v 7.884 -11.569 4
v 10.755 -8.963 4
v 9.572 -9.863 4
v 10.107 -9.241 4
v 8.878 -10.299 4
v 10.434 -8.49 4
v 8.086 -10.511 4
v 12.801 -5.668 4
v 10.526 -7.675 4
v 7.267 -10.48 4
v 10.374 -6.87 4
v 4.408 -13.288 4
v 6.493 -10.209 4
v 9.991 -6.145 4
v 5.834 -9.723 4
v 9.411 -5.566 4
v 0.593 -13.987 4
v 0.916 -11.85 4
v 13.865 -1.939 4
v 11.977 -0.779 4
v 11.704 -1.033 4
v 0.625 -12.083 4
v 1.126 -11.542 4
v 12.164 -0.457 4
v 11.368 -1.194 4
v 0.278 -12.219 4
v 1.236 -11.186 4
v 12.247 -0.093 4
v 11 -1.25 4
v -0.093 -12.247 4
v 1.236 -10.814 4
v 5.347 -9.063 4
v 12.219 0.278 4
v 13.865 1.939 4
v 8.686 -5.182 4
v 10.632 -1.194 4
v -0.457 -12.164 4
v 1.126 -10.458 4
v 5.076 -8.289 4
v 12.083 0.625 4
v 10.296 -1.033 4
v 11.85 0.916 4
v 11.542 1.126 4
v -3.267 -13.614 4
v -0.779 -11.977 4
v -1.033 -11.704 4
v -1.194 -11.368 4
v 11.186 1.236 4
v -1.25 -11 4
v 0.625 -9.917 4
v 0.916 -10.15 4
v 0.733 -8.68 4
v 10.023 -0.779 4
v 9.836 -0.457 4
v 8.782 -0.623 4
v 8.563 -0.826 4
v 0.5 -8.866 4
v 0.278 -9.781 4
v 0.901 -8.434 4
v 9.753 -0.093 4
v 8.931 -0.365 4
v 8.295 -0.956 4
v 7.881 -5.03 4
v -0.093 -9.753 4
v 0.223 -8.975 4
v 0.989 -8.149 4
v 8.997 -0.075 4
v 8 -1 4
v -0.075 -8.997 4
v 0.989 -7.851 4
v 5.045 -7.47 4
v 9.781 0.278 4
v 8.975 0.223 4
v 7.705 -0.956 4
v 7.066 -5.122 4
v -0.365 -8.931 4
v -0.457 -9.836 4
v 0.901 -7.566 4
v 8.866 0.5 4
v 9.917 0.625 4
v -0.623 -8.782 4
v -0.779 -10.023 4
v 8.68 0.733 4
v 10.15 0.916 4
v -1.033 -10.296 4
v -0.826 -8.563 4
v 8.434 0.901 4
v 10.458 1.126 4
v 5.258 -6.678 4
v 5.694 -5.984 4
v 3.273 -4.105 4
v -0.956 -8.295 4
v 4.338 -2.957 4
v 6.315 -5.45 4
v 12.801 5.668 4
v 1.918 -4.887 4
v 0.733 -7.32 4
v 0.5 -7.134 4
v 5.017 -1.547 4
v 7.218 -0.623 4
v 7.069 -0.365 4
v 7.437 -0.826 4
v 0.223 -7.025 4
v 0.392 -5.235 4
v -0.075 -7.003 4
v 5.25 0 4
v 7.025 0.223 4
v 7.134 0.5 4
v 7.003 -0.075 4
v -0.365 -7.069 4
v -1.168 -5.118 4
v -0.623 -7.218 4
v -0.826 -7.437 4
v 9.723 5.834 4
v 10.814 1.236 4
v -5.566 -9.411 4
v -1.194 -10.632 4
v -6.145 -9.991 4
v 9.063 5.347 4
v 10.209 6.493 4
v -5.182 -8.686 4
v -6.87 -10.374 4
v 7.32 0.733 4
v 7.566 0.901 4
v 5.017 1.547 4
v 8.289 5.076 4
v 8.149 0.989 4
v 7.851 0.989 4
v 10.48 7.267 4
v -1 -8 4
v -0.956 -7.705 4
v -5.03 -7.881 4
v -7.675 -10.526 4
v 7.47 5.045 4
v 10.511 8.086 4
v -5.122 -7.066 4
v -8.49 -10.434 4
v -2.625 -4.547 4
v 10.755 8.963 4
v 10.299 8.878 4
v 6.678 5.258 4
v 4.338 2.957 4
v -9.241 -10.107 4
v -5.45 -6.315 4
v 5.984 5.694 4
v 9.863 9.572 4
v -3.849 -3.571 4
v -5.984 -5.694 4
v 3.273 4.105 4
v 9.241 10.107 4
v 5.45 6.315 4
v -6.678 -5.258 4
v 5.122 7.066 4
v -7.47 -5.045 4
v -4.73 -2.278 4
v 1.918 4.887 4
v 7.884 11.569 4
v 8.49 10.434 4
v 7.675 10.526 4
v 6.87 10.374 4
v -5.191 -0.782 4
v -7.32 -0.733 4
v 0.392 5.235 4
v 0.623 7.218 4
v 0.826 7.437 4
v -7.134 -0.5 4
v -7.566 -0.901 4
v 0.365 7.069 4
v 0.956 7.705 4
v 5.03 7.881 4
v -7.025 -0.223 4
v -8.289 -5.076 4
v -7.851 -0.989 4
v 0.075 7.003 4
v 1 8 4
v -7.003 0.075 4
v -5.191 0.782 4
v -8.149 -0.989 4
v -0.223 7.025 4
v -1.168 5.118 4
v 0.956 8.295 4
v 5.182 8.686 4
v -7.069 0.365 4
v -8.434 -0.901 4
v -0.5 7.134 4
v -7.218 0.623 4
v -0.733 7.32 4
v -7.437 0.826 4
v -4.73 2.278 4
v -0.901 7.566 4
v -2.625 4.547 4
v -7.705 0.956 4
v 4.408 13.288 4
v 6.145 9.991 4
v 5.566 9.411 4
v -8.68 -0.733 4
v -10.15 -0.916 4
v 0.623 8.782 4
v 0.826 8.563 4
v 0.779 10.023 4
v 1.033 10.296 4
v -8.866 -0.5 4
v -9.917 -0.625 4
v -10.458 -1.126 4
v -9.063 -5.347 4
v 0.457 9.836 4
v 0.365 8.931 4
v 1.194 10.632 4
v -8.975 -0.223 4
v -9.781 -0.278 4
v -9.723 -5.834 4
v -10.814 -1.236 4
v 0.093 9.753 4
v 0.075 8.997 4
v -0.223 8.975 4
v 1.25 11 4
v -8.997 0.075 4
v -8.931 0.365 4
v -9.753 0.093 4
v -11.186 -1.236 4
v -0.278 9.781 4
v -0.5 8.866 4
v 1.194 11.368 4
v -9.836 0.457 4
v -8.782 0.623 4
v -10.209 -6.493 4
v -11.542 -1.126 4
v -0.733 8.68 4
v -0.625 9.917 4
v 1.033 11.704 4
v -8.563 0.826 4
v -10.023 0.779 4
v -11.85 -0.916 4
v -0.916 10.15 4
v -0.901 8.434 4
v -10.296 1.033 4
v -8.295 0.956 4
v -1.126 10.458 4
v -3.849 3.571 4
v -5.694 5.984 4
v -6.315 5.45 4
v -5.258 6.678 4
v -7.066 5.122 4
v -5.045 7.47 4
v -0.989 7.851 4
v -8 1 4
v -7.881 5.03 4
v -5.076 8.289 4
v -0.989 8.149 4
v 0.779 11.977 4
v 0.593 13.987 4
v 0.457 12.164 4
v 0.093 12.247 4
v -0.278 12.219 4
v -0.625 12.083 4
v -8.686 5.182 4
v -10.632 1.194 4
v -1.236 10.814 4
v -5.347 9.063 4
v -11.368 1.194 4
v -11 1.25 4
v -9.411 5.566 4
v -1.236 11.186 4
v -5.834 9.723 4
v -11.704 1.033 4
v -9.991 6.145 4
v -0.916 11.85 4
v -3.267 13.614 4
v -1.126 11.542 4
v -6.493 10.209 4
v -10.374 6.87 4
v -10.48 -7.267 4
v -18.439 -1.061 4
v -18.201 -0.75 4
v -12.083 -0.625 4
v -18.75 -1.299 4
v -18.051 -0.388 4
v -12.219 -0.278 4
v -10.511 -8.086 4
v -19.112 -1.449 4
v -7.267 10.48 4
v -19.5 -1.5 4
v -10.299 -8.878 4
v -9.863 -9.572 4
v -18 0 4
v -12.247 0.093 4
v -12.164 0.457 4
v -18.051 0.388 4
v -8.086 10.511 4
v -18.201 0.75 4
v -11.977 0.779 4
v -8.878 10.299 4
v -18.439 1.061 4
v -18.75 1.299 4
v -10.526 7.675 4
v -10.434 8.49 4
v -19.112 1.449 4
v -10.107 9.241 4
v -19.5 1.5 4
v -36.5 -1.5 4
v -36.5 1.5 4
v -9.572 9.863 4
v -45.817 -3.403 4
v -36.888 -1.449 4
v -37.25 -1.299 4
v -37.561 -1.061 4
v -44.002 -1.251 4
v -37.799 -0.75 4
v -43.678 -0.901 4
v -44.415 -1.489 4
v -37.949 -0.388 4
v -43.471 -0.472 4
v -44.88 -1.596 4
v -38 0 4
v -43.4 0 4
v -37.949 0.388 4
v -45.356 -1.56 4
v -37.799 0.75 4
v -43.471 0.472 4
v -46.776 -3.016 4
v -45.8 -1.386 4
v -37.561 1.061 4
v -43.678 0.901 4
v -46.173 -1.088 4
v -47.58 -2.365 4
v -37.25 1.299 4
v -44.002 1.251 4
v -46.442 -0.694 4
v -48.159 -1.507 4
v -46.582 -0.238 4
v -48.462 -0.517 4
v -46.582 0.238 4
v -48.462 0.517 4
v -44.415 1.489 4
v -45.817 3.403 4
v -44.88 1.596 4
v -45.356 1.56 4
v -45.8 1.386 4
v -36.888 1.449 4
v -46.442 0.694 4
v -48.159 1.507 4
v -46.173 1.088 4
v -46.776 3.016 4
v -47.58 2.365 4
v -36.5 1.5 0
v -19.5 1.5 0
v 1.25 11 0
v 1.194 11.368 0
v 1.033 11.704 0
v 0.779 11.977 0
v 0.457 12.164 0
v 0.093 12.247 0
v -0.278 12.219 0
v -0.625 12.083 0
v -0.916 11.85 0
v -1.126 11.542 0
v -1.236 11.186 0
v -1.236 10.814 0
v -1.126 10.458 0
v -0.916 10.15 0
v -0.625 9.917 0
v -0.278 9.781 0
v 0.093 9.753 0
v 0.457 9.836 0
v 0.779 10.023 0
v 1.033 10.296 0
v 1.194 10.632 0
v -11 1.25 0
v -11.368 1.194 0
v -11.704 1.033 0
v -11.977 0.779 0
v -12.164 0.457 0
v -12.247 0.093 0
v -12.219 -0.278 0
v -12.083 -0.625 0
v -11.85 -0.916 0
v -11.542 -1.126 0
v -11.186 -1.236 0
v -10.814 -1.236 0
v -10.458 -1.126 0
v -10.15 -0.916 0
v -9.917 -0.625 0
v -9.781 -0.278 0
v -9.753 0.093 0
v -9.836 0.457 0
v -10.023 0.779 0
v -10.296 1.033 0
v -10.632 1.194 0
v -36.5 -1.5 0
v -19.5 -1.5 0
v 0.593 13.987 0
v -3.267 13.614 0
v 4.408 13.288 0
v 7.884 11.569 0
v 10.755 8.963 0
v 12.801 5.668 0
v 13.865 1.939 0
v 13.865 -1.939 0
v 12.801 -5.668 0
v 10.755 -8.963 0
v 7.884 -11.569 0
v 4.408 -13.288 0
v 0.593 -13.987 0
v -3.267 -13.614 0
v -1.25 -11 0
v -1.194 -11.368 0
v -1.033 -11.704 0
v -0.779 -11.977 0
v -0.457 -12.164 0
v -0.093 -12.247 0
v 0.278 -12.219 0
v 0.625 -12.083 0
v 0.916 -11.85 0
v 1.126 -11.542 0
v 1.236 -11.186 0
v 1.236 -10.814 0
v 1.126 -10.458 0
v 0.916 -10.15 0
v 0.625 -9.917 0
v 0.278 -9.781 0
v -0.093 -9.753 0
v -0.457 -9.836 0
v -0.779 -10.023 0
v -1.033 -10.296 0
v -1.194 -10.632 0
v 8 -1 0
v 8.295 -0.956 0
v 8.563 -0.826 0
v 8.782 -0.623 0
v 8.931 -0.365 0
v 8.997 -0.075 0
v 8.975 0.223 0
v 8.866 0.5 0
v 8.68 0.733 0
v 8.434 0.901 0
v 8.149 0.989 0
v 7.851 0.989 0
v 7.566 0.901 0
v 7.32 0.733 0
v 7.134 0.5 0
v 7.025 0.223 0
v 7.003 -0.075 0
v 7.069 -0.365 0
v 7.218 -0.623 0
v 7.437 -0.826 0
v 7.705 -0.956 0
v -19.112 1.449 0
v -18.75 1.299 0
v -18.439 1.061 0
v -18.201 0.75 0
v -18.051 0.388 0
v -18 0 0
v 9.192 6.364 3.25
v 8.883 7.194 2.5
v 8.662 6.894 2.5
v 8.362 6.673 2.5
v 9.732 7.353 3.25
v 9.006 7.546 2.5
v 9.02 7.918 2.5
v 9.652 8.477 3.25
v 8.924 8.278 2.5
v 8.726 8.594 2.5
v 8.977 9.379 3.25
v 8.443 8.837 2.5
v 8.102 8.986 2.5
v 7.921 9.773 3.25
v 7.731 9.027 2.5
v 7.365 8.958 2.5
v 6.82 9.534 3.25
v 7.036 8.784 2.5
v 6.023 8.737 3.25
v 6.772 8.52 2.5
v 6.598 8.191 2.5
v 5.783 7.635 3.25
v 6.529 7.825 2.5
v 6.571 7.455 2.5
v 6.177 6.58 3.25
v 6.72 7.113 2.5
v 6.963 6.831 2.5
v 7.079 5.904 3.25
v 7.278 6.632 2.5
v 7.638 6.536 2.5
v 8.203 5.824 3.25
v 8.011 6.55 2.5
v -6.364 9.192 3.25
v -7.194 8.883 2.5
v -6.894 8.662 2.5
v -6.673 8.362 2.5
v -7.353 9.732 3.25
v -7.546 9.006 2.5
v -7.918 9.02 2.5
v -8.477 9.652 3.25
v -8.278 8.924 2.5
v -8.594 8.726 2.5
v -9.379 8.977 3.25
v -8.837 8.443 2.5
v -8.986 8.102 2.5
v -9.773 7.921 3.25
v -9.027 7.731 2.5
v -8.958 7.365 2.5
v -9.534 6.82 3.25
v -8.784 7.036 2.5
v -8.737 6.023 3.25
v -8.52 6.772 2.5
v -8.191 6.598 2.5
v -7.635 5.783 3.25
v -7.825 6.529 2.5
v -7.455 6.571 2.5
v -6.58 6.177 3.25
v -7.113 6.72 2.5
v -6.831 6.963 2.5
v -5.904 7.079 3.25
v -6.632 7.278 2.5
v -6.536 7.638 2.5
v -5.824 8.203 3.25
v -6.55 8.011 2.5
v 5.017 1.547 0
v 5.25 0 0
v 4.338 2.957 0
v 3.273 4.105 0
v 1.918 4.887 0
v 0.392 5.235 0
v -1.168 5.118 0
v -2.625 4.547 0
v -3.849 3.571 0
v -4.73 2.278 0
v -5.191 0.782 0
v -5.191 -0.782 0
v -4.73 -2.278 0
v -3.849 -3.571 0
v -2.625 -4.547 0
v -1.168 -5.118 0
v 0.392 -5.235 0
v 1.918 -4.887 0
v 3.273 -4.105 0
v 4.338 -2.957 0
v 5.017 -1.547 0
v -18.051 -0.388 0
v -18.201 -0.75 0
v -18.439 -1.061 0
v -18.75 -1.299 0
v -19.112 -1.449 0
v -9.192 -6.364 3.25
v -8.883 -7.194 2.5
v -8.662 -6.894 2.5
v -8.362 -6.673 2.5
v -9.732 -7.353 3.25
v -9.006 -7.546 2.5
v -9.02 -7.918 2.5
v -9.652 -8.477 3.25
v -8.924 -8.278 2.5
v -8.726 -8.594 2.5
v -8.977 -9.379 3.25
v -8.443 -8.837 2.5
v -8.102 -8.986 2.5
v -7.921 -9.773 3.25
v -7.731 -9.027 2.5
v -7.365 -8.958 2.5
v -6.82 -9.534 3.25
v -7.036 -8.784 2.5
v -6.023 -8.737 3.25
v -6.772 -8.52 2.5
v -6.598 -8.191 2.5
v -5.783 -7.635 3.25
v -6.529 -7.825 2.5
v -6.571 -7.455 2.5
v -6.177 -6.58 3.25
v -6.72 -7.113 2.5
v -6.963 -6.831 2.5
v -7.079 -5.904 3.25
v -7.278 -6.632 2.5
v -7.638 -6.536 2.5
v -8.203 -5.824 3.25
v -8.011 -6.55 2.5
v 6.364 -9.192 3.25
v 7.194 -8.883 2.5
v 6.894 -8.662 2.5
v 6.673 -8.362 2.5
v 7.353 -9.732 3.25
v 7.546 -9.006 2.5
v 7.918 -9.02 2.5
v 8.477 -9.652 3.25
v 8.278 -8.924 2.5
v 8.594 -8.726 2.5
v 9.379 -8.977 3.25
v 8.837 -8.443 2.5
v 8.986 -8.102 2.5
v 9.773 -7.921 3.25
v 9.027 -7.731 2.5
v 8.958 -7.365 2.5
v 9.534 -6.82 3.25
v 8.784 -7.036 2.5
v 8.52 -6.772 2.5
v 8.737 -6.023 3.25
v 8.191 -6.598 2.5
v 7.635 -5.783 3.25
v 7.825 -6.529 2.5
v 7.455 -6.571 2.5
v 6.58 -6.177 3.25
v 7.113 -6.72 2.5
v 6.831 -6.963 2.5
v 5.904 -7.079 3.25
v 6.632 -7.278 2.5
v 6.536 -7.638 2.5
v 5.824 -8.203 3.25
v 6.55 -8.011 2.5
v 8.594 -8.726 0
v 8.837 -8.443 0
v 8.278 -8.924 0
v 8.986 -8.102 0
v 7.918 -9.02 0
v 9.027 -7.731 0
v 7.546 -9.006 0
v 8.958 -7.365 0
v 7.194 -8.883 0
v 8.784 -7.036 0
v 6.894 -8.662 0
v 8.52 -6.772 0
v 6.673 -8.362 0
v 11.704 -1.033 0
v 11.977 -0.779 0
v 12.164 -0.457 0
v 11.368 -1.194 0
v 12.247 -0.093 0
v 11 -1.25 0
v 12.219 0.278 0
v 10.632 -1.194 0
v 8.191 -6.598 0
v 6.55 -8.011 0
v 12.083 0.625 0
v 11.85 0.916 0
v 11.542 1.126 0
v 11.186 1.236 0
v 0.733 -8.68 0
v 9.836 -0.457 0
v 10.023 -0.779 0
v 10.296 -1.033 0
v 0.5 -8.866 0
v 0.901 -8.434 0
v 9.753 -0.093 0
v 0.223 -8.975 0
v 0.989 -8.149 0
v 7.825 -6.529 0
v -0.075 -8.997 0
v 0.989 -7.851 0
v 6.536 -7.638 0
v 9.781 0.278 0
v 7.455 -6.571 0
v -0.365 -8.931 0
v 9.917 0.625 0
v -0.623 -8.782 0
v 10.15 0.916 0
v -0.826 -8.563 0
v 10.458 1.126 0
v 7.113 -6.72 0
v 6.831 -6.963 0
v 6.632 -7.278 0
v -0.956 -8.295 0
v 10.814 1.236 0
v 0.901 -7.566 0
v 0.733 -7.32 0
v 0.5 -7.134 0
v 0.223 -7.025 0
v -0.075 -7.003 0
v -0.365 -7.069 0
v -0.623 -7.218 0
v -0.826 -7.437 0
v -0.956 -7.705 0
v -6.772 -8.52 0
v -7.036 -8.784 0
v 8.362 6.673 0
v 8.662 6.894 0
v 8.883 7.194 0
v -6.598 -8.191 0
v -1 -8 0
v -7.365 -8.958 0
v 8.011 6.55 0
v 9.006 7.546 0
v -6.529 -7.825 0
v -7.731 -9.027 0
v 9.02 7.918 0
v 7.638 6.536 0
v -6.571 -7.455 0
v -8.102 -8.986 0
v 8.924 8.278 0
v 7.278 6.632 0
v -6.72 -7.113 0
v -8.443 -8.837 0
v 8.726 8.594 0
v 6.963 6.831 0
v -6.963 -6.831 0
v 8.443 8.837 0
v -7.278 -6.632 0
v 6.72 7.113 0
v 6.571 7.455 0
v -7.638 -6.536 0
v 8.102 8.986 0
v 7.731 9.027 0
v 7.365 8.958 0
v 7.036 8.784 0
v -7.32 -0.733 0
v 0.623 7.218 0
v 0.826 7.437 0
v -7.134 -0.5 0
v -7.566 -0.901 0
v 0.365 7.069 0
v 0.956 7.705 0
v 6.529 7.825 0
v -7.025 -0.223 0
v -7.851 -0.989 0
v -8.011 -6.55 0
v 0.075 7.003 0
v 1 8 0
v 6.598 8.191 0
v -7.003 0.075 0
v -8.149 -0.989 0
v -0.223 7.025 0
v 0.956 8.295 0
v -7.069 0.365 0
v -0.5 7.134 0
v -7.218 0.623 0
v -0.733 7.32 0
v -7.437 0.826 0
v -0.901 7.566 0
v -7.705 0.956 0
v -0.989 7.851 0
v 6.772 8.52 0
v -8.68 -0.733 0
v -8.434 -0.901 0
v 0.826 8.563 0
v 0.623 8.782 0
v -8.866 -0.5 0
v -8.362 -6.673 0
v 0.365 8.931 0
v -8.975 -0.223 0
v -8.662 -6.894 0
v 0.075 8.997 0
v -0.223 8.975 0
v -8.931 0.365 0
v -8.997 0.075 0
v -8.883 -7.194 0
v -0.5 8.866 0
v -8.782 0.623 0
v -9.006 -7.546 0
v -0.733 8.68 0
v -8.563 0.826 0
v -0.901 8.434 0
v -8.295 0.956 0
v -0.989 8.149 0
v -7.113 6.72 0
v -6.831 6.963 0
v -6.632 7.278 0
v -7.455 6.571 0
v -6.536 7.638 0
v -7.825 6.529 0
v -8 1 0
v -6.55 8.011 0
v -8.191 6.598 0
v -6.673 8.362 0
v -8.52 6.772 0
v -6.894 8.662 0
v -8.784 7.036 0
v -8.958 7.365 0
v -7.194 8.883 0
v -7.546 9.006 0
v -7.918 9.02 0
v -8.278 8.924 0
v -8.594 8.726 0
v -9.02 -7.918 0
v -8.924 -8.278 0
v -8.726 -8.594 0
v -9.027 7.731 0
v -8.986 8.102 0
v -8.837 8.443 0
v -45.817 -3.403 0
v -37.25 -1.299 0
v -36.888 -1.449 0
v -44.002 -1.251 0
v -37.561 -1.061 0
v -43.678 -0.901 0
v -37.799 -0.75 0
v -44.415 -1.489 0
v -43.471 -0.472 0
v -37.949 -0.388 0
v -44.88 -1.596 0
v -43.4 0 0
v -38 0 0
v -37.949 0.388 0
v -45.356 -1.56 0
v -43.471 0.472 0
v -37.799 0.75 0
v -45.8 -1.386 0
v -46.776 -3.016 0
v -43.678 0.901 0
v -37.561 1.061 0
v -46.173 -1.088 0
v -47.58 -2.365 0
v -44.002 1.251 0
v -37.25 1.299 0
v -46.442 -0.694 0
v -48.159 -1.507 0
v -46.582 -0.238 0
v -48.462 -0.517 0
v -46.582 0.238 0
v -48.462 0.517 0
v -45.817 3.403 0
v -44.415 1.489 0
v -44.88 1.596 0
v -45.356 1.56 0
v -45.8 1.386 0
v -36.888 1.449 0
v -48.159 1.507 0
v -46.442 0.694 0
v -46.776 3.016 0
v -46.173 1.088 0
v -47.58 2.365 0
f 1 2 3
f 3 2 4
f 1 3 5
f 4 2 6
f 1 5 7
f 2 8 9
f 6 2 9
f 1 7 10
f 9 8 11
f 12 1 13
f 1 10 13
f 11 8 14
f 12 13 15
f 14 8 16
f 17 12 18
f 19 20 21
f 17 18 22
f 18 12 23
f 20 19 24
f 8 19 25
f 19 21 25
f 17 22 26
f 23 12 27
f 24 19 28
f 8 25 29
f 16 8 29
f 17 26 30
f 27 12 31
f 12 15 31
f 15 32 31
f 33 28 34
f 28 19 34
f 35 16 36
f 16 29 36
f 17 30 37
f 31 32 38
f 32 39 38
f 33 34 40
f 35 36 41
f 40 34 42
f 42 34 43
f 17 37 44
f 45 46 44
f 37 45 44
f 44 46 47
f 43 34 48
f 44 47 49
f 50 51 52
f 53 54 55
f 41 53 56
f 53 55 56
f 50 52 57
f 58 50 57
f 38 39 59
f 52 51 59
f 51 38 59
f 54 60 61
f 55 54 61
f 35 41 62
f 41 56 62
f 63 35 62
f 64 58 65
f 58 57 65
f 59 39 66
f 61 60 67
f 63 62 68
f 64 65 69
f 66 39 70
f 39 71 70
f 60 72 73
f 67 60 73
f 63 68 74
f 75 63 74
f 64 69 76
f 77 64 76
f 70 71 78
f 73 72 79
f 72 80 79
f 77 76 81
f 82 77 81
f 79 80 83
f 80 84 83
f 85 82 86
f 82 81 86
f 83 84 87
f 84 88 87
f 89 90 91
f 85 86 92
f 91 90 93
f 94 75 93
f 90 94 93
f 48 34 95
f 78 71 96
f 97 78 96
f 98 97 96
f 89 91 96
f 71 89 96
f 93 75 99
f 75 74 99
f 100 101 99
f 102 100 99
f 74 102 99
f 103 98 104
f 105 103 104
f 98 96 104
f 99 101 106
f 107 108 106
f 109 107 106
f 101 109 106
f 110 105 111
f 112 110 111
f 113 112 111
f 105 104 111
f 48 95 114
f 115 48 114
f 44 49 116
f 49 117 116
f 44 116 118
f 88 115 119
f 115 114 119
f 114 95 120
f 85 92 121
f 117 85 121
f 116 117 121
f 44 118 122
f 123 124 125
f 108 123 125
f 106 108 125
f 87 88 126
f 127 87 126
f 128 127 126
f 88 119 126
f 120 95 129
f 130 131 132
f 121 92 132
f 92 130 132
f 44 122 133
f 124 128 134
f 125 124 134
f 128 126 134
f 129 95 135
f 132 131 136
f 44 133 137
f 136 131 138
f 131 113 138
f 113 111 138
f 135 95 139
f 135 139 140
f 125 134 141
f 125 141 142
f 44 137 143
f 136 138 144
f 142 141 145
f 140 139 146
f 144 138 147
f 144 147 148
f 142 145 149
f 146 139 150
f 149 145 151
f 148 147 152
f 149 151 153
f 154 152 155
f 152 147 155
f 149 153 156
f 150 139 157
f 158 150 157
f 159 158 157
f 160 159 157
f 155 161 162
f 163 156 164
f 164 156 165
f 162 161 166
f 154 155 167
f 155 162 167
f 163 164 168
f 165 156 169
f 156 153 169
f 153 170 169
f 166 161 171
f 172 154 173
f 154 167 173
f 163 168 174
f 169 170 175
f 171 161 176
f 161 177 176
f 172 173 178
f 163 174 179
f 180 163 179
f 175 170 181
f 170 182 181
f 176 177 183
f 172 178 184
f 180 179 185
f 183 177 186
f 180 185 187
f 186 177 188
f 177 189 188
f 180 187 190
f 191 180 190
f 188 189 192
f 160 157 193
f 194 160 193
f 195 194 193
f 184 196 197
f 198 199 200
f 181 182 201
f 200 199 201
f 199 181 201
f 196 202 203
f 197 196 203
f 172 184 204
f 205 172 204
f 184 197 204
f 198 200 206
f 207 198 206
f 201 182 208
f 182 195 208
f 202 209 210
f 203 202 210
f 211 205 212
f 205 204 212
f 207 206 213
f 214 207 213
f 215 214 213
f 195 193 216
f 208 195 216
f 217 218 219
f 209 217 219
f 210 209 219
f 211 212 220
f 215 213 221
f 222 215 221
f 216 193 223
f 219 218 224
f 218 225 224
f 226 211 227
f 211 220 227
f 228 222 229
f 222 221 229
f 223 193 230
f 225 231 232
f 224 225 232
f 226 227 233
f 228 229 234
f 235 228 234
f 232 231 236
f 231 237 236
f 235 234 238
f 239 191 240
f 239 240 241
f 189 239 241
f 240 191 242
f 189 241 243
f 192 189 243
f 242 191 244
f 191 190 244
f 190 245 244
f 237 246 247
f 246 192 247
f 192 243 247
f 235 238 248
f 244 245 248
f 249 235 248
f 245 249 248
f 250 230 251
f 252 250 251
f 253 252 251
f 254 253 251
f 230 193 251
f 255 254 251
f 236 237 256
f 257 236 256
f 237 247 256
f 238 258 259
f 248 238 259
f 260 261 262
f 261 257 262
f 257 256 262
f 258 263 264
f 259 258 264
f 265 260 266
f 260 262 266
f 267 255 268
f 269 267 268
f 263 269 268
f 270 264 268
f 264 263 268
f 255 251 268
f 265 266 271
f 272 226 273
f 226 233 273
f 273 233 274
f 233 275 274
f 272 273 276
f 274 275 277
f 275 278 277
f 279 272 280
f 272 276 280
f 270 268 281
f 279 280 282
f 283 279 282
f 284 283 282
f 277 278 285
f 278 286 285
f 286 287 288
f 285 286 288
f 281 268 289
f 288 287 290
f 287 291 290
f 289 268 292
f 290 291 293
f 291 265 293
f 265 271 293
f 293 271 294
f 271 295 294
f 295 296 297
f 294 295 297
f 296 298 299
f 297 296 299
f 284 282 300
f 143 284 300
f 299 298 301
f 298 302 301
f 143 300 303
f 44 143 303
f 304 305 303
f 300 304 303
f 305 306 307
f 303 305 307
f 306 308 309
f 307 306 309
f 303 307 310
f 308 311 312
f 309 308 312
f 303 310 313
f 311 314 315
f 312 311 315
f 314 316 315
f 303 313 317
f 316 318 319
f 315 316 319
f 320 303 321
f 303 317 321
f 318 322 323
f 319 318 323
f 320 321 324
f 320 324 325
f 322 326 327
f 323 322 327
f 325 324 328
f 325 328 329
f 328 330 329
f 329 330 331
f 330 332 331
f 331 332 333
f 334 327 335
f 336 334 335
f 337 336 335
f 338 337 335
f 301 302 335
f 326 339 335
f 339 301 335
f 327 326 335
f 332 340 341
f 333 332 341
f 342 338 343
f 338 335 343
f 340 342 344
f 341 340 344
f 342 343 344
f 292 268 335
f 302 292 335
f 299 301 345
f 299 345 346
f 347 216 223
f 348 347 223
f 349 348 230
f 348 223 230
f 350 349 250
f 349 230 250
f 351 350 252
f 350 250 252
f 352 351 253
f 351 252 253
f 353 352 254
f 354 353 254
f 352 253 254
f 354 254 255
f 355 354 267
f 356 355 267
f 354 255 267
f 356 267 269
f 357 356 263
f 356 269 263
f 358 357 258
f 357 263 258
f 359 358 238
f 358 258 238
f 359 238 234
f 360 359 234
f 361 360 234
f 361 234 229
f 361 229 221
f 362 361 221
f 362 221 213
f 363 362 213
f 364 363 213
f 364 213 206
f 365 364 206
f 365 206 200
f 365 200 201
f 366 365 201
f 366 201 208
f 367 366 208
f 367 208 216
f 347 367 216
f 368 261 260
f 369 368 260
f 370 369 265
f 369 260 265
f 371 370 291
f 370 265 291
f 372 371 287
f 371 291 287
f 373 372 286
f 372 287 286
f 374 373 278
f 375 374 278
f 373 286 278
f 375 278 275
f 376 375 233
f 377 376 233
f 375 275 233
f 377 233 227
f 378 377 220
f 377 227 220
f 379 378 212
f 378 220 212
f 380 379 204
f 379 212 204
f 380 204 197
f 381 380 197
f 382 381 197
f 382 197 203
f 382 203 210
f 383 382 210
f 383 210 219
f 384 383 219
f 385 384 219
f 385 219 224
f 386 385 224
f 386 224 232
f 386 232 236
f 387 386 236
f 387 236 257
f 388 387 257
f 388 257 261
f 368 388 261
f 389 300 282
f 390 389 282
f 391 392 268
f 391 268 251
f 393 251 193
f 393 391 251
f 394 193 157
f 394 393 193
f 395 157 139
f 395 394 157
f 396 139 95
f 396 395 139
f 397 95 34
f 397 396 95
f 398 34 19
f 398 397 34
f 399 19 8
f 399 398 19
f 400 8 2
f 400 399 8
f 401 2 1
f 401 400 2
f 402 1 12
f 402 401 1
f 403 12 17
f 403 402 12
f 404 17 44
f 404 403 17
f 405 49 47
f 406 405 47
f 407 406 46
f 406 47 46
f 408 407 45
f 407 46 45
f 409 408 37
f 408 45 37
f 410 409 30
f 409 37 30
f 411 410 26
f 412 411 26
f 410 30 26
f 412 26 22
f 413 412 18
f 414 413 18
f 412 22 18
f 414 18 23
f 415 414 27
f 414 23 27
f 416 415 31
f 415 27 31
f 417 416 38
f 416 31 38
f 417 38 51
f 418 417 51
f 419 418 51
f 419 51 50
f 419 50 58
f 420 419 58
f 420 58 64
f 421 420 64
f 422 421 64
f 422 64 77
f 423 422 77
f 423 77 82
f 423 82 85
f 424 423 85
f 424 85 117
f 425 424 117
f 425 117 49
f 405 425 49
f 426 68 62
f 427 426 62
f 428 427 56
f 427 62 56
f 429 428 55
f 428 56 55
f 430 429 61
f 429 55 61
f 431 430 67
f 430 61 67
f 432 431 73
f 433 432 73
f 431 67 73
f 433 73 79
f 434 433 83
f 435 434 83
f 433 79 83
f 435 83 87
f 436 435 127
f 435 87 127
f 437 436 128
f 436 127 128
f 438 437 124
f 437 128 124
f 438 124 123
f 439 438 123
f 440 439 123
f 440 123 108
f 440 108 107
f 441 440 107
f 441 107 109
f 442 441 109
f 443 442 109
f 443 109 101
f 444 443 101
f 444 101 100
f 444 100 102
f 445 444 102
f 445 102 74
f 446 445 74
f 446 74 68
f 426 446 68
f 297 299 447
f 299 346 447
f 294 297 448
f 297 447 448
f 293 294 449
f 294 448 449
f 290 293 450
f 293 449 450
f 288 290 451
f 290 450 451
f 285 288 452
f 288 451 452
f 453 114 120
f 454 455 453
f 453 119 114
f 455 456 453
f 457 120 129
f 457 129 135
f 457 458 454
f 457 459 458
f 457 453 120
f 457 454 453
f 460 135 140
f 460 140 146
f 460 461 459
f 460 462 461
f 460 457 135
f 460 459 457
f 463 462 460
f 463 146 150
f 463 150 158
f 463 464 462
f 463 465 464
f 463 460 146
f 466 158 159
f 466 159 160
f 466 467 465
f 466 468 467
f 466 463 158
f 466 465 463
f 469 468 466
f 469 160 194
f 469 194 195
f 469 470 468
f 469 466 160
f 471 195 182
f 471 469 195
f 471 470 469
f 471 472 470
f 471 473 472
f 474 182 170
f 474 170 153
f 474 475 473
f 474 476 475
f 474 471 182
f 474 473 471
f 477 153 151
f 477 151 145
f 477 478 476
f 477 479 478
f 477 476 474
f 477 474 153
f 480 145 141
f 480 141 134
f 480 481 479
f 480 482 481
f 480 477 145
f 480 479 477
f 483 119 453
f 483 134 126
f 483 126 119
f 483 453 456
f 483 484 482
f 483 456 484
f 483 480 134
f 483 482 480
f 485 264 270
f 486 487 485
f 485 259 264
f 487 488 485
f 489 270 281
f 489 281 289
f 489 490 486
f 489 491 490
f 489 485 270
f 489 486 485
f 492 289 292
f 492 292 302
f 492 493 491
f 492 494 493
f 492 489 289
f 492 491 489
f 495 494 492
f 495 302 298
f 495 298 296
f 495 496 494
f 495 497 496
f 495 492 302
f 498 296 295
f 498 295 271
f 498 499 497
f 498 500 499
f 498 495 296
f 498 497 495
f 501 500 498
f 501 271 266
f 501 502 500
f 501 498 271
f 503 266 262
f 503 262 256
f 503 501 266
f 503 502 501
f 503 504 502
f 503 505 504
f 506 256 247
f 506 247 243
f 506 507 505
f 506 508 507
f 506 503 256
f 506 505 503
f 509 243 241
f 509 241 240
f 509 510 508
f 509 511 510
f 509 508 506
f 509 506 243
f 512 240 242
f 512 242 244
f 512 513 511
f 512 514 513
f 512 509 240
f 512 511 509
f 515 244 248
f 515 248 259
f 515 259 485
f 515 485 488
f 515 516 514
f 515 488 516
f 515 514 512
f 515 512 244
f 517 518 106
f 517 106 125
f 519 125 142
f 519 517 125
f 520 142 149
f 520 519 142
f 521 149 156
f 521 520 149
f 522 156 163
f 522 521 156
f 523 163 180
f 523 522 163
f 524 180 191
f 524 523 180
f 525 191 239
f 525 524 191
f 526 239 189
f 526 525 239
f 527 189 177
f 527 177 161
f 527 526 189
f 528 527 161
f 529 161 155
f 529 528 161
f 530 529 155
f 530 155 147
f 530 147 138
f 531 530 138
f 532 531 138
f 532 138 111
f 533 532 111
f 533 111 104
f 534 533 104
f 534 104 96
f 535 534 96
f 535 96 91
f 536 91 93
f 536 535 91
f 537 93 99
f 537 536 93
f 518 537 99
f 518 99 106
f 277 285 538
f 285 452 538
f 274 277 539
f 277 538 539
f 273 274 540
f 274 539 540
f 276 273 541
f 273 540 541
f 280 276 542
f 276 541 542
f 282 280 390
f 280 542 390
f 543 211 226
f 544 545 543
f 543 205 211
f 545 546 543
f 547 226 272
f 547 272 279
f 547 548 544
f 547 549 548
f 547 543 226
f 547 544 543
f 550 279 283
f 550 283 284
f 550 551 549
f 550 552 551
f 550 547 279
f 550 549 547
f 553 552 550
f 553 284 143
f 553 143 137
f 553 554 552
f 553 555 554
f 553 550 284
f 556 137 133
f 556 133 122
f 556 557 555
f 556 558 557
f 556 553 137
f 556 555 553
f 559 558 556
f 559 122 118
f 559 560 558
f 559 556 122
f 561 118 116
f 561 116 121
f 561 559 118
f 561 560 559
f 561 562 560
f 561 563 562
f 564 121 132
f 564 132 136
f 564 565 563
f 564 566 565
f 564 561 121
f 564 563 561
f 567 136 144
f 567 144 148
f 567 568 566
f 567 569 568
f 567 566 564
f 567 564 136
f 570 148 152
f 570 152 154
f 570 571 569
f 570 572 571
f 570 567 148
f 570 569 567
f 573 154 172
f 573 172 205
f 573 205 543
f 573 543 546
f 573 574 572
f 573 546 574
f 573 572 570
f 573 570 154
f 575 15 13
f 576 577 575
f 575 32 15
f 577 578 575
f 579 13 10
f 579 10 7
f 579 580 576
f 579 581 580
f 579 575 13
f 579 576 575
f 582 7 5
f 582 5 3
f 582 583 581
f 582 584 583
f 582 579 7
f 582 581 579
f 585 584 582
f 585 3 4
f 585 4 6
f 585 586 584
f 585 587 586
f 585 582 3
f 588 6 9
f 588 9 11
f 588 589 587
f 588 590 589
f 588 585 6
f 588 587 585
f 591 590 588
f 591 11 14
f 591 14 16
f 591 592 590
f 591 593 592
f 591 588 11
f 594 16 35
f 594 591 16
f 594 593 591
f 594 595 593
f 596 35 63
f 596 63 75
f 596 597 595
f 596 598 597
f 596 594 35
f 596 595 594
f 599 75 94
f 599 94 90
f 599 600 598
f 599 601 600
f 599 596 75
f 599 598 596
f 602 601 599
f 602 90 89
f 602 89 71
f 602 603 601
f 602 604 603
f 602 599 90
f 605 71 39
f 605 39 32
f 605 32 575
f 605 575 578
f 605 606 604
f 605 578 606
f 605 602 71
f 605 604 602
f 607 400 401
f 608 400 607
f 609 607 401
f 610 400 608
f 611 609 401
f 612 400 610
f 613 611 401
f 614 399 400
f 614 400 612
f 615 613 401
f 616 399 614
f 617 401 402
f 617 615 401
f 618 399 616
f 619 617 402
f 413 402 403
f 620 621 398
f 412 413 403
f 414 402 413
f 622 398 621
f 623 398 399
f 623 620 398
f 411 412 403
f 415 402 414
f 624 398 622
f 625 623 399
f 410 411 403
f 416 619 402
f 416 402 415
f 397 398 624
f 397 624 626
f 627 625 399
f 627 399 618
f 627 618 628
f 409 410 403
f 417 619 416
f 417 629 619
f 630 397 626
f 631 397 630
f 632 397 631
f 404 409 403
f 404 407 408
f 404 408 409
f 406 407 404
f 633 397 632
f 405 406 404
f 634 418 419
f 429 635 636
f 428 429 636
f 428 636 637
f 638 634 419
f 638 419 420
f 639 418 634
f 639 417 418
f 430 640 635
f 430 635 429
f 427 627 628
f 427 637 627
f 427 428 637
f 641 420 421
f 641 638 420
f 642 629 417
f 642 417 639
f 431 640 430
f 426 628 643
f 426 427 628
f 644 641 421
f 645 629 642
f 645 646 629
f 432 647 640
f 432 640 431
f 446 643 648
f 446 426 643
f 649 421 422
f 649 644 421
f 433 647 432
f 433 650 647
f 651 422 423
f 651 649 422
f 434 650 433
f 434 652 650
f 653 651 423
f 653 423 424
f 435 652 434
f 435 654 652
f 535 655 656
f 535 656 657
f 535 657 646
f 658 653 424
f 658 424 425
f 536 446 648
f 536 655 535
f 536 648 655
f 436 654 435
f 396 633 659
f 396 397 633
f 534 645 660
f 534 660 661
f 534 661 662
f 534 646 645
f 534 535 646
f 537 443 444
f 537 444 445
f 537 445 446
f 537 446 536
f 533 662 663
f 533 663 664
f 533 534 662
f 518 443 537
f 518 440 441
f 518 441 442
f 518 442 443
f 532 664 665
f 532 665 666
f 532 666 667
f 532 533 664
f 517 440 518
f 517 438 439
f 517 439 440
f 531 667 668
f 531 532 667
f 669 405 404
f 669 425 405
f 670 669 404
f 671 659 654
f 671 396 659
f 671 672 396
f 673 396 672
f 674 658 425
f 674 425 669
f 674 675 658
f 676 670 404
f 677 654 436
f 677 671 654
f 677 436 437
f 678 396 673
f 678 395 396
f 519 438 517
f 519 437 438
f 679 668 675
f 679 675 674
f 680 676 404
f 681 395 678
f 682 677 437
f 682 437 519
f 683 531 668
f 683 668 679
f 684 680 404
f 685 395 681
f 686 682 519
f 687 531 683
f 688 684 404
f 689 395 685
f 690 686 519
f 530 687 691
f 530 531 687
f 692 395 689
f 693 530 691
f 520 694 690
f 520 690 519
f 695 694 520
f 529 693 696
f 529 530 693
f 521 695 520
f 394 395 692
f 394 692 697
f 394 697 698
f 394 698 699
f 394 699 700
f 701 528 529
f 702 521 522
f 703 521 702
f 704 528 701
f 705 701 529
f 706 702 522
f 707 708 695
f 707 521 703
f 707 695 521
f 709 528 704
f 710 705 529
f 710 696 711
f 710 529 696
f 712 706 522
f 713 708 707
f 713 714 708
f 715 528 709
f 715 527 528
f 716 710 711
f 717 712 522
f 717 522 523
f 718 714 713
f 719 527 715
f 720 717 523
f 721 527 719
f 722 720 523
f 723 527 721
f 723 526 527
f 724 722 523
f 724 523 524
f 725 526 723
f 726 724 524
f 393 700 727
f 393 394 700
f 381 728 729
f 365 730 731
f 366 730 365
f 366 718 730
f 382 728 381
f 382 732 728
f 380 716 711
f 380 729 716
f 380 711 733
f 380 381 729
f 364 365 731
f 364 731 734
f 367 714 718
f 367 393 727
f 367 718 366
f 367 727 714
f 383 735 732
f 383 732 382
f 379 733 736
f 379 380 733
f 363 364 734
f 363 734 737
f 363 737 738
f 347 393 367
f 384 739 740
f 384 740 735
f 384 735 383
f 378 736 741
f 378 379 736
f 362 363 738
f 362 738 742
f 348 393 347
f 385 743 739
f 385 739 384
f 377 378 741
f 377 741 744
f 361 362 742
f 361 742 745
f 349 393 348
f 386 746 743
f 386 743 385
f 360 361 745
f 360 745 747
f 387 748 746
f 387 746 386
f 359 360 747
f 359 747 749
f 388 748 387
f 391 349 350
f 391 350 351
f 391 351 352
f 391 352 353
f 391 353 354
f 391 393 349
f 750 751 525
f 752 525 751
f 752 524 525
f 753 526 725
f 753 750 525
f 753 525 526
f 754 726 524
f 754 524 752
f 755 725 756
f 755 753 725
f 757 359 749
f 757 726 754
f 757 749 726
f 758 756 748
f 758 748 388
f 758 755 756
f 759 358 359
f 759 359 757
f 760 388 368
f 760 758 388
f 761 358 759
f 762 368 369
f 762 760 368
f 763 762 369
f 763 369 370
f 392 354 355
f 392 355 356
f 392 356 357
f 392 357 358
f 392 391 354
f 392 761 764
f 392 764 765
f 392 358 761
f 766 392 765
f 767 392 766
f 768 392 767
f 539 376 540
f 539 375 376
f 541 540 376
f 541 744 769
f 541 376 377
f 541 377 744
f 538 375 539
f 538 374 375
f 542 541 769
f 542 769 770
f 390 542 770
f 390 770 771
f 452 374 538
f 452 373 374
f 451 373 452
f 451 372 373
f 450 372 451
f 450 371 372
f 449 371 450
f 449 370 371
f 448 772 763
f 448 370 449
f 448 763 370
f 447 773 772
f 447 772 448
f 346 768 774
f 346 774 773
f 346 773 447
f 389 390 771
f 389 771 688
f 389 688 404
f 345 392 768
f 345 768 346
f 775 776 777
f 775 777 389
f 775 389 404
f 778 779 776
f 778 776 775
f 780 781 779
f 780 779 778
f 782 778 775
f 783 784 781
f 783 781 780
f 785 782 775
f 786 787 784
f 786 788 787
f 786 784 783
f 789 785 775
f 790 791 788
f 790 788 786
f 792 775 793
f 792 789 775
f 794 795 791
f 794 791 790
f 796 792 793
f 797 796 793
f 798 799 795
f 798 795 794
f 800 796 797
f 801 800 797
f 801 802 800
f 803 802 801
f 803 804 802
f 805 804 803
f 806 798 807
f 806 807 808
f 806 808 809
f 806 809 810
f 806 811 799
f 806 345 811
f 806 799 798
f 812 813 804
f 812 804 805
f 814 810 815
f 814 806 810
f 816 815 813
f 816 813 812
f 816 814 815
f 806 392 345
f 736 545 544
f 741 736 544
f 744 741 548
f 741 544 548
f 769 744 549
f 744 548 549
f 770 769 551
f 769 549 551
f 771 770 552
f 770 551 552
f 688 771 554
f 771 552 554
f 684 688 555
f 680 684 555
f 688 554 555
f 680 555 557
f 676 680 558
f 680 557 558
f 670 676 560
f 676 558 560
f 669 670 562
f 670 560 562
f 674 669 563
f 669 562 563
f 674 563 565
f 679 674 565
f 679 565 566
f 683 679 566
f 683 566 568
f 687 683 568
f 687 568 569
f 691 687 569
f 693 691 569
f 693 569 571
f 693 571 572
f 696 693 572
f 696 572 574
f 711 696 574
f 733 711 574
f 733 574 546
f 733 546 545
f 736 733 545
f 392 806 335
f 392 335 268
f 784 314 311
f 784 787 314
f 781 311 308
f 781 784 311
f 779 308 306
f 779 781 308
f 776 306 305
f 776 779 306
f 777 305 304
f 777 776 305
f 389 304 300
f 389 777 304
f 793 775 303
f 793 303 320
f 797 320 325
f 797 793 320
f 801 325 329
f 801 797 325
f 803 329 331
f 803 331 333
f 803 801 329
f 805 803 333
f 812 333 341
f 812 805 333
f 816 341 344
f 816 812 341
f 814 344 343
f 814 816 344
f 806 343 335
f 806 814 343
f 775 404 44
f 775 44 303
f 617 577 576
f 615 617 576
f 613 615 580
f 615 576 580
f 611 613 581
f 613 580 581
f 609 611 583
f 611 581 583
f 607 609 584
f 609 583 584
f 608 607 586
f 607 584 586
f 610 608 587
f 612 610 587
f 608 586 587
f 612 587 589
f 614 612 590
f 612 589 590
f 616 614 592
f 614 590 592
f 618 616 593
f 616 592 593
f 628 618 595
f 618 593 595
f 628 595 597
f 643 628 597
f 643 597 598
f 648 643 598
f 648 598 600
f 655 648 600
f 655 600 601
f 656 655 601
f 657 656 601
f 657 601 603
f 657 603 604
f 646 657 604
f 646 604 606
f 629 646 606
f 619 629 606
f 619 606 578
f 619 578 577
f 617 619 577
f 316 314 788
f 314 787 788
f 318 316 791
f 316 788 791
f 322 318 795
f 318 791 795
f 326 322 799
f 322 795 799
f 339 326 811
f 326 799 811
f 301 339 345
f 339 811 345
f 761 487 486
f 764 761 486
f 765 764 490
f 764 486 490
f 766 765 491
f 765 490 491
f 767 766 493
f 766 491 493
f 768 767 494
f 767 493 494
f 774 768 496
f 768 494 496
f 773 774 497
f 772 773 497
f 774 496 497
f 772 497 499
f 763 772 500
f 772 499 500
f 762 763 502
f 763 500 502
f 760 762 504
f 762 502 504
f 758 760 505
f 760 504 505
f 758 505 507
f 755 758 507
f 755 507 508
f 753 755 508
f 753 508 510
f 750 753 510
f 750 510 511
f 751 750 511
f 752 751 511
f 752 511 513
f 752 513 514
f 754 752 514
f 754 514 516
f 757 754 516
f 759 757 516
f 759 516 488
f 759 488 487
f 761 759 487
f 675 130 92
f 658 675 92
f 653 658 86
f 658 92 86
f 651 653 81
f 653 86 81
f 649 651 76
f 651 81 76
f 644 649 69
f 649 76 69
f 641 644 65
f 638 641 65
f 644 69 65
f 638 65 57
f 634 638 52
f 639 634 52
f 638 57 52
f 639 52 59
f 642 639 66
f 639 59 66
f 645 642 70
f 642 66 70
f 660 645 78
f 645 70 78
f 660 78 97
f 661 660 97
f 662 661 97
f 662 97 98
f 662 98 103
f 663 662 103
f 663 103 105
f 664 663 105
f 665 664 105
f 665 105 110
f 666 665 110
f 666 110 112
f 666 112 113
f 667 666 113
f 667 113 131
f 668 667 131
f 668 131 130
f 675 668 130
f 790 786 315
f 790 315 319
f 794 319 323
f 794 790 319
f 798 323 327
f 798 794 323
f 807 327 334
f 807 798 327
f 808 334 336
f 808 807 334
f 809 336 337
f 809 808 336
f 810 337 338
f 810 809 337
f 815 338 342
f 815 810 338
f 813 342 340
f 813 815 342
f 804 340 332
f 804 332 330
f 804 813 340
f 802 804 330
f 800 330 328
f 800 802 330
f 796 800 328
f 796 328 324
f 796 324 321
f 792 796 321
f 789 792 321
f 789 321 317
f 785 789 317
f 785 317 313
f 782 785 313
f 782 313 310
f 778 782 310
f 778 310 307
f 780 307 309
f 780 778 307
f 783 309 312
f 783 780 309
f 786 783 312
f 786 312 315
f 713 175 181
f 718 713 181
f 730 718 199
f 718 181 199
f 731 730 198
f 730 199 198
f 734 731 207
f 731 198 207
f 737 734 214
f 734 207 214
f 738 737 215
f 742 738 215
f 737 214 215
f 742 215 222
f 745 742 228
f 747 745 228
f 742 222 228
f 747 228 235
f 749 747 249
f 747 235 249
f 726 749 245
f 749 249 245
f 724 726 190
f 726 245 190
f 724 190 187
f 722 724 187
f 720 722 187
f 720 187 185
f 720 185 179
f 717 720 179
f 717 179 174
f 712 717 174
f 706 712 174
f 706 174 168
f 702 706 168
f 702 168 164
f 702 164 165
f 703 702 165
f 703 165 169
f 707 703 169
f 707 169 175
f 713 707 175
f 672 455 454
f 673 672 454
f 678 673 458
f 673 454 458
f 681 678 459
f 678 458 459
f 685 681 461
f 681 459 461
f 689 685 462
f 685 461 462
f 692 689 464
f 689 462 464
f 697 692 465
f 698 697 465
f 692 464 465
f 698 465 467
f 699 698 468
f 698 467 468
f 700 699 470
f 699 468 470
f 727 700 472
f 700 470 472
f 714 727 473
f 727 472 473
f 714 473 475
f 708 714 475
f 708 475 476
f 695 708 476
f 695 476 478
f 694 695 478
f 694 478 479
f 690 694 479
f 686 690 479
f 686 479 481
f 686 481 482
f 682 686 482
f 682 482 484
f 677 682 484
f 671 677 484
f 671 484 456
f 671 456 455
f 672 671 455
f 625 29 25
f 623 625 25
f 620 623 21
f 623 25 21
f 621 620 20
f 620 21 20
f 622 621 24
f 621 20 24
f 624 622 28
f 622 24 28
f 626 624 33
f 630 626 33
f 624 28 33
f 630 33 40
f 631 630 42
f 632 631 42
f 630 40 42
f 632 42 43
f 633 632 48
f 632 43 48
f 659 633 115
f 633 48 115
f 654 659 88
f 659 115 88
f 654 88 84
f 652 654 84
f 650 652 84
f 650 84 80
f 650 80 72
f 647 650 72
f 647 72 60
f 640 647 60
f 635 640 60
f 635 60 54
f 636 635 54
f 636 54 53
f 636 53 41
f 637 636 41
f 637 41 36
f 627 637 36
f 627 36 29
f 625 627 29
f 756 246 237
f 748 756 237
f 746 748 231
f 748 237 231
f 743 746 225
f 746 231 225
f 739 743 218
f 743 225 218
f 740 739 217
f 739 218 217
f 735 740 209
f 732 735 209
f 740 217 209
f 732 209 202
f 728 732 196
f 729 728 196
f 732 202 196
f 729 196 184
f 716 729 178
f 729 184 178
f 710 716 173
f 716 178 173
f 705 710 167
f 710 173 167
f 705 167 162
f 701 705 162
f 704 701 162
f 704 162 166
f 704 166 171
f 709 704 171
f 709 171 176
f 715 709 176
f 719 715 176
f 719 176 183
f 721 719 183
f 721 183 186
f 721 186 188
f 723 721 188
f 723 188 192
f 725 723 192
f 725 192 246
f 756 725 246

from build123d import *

# Parameters (mm, degrees)
SKETCH1_R           = 1.6
SKETCH1_R_2         = 5.25
BOSS_EXTRUDE1_DEPTH = 4
CUT_EXTRUDE1_REACH  = 52.638
SKETCH2_R           = 1
CIRPATTERN1_COUNT   = 4
CUT_EXTRUDE2_REACH  = 52.638
SKETCH3_R           = 1.25
CIRPATTERN2_COUNT   = 8
CHAMFER1_SIZE       = 1.5
CUT_EXTRUDE3_REACH  = 52.638
SKETCH4_W           = 20
SKETCH4_H           = 3
FILLET1_R           = 1.5


with BuildPart() as part:
    # Sketch1 → Boss-Extrude1 (new body)
    with BuildSketch(Plane.XY):
        with BuildLine():
            Line((-45.816666667, 3.403388834), (-3.266666667, 13.613555336))
            ThreePointArc((-3.266666667, 13.613555336), (14, 0), (-3.266666667, -13.613555336))
            Line((-3.266666667, -13.613555336), (-45.816666667, -3.403388834))
            ThreePointArc((-45.816666667, -3.403388834), (-48.5, 0), (-45.816666667, 3.403388834))
        make_face()
        with Locations((-45, 0)):
            Circle(SKETCH1_R, mode=Mode.SUBTRACT)
        Circle(SKETCH1_R_2, mode=Mode.SUBTRACT)
    extrude(amount=BOSS_EXTRUDE1_DEPTH)

    # Sketch2 → Cut-Extrude1 (cut, up to next)
    with BuildSketch(Plane.XY.offset(4), mode=Mode.PRIVATE) as cut_extrude1_sk1:
        with Locations((0, 8)):
            Circle(SKETCH2_R)
    cut_extrude1_tool1 = extrude(cut_extrude1_sk1.sketch, amount=-CUT_EXTRUDE1_REACH, mode=Mode.PRIVATE) & part.part
    cut_extrude1 = cut_extrude1_tool1.solids().sort_by_distance((0, 8, 4))[0]
    add(cut_extrude1, mode=Mode.SUBTRACT)

    # CirPattern1: Cut-Extrude1 ×4 about axis
    cirpattern1_axis = Axis((0, 0, 0), (0, 0, 1))
    for i in range(1, CIRPATTERN1_COUNT):
        add(cut_extrude1.rotate(cirpattern1_axis, i * 360 / CIRPATTERN1_COUNT), mode=Mode.SUBTRACT)

    # Sketch3 → Cut-Extrude2 (cut, up to next)
    with BuildSketch(Plane.XY.offset(4), mode=Mode.PRIVATE) as cut_extrude2_sk1:
        with Locations((0, 11)):
            Circle(SKETCH3_R)
    cut_extrude2_tool1 = extrude(cut_extrude2_sk1.sketch, amount=-CUT_EXTRUDE2_REACH, mode=Mode.PRIVATE) & part.part
    cut_extrude2 = cut_extrude2_tool1.solids().sort_by_distance((0, 11, 4))[0]
    add(cut_extrude2, mode=Mode.SUBTRACT)

    # CirPattern2: Cut-Extrude2 ×8 about axis
    cirpattern2_axis = Axis((0, 0, 0), (0, 0, 1))
    for i in range(1, CIRPATTERN2_COUNT):
        add(cut_extrude2.rotate(cirpattern2_axis, i * 360 / CIRPATTERN2_COUNT), mode=Mode.SUBTRACT)

    # Chamfer1
    chamfer1_edges = [part.edges().sort_by_distance(p)[0] for p in [
        (-6.894291117, -8.66205807, 4),
        (8.66205807, -6.894291117, 4),
        (6.894291117, 8.66205807, 4),
        (-8.66205807, 6.894291117, 4),
    ]]
    chamfer(chamfer1_edges, length=CHAMFER1_SIZE)

    # Sketch4 → Cut-Extrude3 (cut, up to next)
    with BuildSketch(Plane.XY.offset(4), mode=Mode.PRIVATE) as cut_extrude3_sk1:
        with Locations((-28, 0)):
            Rectangle(SKETCH4_W, SKETCH4_H)
    cut_extrude3_tool1 = extrude(cut_extrude3_sk1.sketch, amount=-CUT_EXTRUDE3_REACH, mode=Mode.PRIVATE) & part.part
    add(cut_extrude3_tool1.solids().sort_by_distance((-28, 0, 4))[0], mode=Mode.SUBTRACT)

    # Fillet1
    fillet1_edges = [part.edges().sort_by_distance(p)[0] for p in [
        (-18, -1.5, 2),
        (-18, 1.5, 2),
        (-38, 1.5, 2),
        (-38, -1.5, 2),
    ]]
    fillet(fillet1_edges, radius=FILLET1_R - 0.0001)  # a hair under: the kernel refuses the full size


solid = part.part
